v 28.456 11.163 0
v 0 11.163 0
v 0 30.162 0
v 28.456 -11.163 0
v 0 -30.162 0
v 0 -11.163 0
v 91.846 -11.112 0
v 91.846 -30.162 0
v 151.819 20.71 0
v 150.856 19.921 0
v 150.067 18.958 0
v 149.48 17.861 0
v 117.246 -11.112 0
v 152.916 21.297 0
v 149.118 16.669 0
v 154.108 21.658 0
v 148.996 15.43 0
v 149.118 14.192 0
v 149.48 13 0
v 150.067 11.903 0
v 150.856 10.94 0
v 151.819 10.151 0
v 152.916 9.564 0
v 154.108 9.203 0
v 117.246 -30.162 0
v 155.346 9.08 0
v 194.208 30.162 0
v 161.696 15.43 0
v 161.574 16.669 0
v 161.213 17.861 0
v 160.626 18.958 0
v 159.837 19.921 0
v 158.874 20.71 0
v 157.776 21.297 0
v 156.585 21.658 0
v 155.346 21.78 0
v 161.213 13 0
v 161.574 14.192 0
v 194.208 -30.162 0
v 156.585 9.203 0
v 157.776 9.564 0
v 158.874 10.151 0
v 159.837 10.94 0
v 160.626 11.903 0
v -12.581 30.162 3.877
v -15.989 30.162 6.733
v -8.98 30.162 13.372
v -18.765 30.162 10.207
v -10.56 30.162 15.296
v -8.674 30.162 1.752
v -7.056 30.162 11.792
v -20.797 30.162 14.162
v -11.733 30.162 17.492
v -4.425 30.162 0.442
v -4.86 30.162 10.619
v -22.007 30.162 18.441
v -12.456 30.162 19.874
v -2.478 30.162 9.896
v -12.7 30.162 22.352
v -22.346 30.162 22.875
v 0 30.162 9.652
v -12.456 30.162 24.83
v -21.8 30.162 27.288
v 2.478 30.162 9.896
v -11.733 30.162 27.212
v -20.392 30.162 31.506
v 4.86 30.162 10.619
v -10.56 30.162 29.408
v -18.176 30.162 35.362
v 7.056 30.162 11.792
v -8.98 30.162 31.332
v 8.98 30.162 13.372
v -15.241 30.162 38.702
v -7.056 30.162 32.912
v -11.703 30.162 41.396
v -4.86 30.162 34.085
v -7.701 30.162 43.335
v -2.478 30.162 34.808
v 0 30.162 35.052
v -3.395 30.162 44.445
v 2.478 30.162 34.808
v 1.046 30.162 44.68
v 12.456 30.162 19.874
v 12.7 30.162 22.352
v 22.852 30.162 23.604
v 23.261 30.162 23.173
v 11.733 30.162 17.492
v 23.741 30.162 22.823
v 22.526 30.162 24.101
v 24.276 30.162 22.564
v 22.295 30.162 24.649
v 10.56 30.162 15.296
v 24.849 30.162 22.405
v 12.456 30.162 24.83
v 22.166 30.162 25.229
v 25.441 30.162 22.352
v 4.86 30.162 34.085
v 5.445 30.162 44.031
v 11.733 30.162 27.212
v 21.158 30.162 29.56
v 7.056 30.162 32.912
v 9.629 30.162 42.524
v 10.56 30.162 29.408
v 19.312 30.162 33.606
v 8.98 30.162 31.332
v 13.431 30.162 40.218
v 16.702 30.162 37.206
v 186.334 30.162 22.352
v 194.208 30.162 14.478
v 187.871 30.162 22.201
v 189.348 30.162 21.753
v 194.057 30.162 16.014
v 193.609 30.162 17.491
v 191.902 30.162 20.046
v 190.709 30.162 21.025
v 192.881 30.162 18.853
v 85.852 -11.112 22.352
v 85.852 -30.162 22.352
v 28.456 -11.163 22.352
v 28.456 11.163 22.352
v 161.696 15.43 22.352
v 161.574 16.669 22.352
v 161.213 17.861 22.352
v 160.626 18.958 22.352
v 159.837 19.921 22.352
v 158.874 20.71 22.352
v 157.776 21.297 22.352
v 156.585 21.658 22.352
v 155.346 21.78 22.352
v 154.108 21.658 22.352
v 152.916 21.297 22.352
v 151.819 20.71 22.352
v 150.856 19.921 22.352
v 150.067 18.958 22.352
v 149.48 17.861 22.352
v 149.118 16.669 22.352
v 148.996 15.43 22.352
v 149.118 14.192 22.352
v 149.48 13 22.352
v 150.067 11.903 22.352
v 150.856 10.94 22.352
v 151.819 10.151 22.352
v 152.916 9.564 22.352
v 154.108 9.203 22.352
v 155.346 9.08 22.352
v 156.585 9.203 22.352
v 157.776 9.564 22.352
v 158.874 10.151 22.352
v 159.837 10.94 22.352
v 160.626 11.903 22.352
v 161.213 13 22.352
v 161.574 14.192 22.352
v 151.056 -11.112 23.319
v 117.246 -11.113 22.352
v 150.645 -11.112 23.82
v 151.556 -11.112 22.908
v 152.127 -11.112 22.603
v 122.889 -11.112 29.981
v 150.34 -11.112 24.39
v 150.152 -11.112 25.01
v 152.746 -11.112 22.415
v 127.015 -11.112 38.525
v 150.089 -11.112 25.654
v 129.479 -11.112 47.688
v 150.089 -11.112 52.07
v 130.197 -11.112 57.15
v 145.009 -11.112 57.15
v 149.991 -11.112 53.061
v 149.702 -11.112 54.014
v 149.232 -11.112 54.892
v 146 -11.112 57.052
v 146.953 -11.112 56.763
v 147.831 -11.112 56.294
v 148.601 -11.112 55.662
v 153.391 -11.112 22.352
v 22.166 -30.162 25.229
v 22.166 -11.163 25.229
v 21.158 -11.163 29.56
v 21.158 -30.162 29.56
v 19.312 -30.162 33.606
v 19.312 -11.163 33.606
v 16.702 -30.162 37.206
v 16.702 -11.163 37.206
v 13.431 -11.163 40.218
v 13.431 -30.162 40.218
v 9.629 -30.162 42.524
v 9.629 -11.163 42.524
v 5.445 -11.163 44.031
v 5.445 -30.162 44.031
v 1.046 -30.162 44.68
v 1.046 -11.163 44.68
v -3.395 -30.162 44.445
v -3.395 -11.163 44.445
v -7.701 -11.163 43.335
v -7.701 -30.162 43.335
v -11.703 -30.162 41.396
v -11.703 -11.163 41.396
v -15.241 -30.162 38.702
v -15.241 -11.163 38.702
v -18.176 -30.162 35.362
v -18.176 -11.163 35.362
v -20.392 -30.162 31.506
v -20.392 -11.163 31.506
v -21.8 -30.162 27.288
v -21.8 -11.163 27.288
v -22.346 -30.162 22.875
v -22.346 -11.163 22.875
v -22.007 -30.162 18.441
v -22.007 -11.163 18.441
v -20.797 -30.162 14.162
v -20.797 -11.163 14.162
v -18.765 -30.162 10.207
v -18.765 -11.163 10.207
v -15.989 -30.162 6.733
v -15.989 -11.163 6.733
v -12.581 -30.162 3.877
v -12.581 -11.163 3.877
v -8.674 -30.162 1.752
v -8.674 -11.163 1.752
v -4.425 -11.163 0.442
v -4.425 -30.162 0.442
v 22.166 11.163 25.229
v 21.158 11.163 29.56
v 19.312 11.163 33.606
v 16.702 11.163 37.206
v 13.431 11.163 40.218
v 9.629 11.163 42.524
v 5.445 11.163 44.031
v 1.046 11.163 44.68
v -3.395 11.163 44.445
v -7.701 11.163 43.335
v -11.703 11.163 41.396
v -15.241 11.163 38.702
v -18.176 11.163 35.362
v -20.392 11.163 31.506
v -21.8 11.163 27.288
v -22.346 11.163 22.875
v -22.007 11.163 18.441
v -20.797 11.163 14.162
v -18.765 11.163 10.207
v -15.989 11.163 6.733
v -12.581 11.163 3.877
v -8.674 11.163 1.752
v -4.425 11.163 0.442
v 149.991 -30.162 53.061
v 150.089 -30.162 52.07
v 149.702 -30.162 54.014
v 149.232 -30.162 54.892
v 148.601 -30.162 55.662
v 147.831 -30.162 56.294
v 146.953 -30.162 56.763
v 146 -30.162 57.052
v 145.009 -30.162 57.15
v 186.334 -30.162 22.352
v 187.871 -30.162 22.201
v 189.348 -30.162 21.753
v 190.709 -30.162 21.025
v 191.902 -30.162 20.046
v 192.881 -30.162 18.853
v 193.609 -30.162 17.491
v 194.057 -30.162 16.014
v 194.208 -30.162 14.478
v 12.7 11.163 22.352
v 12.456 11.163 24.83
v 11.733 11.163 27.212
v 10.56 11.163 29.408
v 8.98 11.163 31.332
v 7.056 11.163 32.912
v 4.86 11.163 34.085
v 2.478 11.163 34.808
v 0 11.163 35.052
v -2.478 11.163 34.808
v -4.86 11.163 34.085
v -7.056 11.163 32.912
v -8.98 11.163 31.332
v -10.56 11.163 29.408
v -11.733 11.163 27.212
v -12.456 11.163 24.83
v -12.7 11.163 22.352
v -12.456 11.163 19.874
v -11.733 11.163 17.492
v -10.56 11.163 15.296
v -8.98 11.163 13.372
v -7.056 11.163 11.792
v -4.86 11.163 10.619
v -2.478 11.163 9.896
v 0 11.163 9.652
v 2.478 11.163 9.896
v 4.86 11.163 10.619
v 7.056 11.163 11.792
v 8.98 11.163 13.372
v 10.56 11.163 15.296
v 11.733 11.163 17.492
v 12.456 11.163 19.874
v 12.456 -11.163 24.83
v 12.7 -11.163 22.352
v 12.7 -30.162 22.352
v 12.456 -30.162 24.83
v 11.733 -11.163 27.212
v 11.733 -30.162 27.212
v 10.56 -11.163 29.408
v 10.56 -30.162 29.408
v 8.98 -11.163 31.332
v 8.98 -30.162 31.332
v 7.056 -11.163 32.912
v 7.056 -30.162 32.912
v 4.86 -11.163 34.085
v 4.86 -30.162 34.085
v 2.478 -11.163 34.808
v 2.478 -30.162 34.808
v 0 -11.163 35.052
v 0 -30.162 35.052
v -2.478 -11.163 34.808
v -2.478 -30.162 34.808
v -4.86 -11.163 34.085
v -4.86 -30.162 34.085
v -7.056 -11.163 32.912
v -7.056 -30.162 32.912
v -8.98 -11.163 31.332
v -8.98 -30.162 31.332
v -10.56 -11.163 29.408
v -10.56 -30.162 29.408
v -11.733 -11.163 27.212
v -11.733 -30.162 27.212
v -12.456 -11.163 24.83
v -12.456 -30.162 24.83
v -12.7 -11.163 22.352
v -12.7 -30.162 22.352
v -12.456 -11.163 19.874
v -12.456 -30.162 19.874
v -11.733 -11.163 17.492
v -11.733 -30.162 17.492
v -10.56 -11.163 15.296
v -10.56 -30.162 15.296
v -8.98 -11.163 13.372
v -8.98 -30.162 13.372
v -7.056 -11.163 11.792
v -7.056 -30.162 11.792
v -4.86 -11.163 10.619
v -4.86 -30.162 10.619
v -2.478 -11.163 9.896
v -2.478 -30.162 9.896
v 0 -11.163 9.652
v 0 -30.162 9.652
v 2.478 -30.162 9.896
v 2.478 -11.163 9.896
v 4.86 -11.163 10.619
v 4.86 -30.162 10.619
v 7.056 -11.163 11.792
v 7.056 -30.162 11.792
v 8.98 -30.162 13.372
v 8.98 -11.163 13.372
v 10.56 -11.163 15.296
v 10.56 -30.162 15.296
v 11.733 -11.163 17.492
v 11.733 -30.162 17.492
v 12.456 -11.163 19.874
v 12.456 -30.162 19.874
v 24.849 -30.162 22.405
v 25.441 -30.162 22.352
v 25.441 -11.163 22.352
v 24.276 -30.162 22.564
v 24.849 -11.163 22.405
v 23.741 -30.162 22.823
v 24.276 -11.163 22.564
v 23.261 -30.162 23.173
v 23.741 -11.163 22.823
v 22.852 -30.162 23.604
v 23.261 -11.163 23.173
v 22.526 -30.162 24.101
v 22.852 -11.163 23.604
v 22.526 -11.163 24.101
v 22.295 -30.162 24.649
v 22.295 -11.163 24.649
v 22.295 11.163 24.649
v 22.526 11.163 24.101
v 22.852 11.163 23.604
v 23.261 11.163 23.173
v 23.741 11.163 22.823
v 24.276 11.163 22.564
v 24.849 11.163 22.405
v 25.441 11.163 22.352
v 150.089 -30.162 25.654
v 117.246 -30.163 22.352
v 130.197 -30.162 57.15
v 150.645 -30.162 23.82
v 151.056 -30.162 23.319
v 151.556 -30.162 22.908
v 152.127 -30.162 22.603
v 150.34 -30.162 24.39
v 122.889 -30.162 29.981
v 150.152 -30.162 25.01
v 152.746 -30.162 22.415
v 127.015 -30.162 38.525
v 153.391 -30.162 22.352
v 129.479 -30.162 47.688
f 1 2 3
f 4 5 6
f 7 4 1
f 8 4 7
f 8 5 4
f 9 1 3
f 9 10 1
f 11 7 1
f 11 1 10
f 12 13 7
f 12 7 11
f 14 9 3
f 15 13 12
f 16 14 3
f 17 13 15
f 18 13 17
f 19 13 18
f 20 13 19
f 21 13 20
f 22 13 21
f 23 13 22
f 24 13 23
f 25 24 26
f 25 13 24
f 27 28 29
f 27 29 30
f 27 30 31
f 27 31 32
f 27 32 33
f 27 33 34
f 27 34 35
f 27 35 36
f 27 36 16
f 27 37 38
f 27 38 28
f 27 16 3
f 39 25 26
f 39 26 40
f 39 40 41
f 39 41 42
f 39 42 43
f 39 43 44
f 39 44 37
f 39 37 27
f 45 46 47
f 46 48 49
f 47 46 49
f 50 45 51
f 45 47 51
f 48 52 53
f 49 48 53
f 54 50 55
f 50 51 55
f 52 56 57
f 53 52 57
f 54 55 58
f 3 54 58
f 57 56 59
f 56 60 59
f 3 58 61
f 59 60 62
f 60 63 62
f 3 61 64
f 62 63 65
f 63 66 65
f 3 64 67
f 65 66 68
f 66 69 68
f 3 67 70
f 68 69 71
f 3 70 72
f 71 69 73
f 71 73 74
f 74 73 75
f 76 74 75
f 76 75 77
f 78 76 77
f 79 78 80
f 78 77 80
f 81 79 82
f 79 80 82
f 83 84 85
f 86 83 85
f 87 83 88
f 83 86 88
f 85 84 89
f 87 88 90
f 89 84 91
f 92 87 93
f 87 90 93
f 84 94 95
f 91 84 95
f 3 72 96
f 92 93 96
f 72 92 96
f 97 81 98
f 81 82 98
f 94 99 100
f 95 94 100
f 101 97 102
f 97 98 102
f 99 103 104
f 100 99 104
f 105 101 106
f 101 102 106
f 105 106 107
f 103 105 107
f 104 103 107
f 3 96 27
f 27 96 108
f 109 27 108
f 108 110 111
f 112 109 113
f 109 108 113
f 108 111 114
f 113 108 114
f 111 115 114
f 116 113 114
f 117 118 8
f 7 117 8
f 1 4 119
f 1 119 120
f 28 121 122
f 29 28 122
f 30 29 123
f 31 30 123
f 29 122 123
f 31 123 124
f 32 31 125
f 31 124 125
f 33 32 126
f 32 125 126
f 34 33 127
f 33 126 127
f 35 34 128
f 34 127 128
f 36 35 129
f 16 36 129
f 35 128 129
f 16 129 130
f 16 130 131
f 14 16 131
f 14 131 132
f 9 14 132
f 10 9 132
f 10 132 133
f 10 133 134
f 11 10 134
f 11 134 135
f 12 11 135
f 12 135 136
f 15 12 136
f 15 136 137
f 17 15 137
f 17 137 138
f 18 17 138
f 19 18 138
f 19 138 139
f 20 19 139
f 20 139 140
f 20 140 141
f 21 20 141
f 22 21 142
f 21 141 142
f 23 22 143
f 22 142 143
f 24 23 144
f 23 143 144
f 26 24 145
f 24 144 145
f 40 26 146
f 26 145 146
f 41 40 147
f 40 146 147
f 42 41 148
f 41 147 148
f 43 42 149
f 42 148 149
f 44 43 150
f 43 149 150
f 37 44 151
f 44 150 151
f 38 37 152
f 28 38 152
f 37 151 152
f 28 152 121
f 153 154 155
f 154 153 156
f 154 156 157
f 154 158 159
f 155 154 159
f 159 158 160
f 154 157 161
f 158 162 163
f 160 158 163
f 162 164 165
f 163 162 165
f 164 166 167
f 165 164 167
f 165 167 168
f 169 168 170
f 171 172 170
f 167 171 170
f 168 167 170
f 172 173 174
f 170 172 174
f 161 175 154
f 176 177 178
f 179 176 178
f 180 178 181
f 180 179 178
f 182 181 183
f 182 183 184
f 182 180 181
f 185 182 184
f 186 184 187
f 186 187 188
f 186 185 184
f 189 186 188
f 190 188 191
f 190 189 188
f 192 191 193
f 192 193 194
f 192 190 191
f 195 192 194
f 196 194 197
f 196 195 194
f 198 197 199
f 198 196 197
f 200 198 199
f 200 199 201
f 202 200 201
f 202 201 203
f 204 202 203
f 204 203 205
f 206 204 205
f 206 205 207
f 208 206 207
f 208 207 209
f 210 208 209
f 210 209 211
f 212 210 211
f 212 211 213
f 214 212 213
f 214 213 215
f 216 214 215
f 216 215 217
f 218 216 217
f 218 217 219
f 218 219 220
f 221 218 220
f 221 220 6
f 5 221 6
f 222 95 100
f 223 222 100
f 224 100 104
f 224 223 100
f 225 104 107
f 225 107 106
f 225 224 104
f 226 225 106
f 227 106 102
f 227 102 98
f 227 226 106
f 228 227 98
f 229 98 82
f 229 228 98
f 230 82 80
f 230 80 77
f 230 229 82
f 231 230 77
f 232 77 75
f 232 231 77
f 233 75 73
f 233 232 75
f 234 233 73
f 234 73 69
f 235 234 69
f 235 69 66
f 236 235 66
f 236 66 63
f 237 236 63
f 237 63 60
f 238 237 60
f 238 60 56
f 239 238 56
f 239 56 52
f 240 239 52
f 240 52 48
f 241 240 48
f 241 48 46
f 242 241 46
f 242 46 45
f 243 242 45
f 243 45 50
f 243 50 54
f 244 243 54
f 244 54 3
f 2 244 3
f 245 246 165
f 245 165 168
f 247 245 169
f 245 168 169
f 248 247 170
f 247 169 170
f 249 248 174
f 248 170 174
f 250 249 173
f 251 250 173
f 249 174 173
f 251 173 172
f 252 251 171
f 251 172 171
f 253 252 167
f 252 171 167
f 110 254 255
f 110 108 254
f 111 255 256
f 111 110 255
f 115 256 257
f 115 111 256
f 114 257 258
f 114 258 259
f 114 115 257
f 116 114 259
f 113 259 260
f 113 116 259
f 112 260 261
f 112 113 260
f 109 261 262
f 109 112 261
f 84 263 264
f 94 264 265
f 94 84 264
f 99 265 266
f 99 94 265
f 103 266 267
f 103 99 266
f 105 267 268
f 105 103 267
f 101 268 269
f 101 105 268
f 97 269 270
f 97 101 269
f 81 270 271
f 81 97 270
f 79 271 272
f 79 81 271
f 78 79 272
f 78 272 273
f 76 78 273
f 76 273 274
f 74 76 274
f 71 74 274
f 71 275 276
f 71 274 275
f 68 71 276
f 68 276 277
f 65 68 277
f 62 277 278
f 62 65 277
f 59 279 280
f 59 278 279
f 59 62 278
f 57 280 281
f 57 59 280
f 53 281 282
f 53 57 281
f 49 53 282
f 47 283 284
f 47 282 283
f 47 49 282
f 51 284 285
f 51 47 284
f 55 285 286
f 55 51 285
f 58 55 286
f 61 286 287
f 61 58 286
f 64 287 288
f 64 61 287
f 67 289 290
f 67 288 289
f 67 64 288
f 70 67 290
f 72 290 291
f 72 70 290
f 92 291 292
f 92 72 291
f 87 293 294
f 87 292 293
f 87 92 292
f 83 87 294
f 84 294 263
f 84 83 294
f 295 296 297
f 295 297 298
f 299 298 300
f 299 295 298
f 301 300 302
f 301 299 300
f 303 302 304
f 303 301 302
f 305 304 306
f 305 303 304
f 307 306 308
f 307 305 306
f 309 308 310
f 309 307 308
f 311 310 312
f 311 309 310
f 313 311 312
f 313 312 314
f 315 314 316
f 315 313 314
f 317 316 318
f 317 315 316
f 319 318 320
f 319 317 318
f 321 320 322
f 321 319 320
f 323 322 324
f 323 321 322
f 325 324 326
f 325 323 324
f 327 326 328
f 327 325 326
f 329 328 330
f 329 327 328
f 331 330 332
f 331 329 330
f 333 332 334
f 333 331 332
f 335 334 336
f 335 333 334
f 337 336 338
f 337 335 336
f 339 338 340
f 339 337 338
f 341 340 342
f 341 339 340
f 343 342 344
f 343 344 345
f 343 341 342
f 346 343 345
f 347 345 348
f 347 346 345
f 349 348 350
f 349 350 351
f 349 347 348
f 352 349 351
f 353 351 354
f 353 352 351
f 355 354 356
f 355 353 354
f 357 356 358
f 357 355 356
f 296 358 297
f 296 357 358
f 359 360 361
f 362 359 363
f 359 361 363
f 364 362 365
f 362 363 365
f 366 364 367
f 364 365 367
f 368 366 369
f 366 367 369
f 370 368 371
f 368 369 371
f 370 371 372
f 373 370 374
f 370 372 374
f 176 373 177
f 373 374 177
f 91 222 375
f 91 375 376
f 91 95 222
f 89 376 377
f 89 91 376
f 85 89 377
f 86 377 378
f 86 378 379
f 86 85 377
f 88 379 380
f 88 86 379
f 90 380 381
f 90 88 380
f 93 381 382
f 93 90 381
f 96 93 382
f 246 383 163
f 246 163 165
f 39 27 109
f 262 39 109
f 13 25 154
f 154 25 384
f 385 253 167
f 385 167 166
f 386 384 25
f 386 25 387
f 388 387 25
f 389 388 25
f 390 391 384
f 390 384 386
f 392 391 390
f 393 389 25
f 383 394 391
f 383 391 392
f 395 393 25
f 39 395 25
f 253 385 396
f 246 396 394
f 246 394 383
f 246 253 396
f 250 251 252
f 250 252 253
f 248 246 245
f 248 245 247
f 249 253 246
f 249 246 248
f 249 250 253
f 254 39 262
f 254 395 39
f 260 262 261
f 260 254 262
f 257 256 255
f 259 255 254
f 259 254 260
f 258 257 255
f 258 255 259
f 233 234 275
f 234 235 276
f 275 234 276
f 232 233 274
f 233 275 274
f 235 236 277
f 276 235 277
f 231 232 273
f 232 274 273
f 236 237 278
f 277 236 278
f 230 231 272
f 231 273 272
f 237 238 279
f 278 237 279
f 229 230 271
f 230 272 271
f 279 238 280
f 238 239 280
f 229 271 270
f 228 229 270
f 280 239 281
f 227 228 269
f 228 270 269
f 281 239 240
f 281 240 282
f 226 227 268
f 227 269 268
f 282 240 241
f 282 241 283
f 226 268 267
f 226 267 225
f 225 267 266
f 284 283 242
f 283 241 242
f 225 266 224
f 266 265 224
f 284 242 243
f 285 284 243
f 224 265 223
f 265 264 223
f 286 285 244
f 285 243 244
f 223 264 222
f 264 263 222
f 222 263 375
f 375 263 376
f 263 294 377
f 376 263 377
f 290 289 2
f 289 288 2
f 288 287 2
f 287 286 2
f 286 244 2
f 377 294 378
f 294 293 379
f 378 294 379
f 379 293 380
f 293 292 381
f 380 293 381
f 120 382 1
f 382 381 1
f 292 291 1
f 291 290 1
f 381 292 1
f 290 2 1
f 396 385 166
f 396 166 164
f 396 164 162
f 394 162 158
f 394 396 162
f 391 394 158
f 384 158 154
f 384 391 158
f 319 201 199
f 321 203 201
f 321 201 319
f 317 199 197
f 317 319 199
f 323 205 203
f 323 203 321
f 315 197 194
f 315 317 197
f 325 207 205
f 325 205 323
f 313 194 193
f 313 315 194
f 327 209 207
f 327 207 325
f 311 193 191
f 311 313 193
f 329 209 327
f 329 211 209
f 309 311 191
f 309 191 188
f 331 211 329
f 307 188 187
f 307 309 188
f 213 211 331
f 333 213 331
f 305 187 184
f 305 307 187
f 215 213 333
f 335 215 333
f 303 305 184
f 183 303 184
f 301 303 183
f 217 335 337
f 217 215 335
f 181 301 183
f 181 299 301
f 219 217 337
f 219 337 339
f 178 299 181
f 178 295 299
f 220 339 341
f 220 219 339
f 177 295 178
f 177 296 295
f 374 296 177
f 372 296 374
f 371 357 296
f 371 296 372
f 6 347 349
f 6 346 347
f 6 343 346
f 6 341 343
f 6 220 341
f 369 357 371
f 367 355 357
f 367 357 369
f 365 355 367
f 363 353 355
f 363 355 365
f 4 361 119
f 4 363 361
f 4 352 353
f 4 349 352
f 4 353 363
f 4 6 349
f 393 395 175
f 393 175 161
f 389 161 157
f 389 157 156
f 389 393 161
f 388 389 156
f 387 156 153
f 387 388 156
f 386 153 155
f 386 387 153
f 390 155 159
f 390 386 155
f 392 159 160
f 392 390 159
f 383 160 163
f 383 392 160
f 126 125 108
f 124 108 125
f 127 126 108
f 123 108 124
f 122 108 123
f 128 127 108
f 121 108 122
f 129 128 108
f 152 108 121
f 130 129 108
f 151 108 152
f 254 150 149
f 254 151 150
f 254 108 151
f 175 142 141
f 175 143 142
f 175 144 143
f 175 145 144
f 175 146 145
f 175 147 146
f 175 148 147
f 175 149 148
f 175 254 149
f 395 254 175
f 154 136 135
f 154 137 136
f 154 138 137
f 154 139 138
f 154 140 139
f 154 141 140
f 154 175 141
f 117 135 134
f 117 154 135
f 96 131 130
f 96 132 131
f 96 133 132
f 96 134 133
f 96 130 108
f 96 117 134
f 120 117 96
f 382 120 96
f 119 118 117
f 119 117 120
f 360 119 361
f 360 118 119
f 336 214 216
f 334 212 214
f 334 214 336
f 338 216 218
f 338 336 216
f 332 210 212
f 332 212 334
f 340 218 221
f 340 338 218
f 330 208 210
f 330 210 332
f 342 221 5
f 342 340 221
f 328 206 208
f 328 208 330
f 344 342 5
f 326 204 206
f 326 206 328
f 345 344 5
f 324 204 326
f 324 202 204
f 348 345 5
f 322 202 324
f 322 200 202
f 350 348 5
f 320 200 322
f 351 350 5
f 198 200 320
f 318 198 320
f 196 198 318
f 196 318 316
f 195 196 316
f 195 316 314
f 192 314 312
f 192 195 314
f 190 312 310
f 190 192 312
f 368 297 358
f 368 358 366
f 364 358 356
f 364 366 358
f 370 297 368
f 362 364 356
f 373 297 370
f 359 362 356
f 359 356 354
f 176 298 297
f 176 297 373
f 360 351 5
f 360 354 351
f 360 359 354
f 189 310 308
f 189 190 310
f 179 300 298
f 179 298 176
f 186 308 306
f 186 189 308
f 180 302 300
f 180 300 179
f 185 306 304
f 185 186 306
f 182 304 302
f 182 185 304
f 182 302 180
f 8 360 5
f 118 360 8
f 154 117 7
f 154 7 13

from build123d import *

# Parameters (mm, degrees)
F0_R      = 12.7
F1_DEPTH  = 30.1625
F2_W      = 56.912827603
F2_H      = 22.3266
F3_DEPTH  = 44.705
F4_R      = 3.302
F5_R      = 3.302
F6_R      = 6.35
F7_DEPTH  = 22.353
F9_DEPTH  = 19.05
F11_DEPTH = 19.05
F12_R     = 7.874
F13_R     = 5.08


with BuildPart() as f1:
    # F0 (on Front) → F1 (new body, symmetric)
    with BuildSketch(Plane.XZ):
        with BuildLine():
            ThreePointArc((22.352, 22.352), (-15.8052507731, 38.1572507731), (0, 0))
            Line((0, 0), (194.2084, 0))
            Line((194.2084, 0), (194.2084, 22.352))
            Line((194.2084, 22.352), (22.352, 22.352))
        make_face()
        with Locations((0, 22.352)):
            Circle(F0_R, mode=Mode.SUBTRACT)
    extrude(amount=F1_DEPTH, both=True)

    # F2 (on Top) → F3 (cut, through all)
    with BuildSketch(Plane.XY):
        Rectangle(F2_W, F2_H)
    extrude(amount=F3_DEPTH, mode=Mode.SUBTRACT)

    # F4
    f4_edges = [f1.edges().sort_by_distance(p)[0] for p in [
        (22.352, 20.6629, 22.352),
    ]]
    fillet(f4_edges, radius=F4_R)

    # F5
    f5_edges = [f1.edges().sort_by_distance(p)[0] for p in [
        (22.352, -20.6629, 22.352),
    ]]
    fillet(f5_edges, radius=F5_R)

    # F6 (on face) → F7 (cut, through all)
    with BuildSketch(Plane.XY.offset(22.352)):
        with Locations((155.3464, 15.4305)):
            Circle(F6_R)
    extrude(amount=-F7_DEPTH, mode=Mode.SUBTRACT)

    # F8 (on face) → F9 (cut)
    with BuildSketch(Plane.XZ.offset(30.1625)):
        Polygon((117.2464, 0), (117.2464, 22.352), (85.852, 22.352), (91.8464, 0), align=None)
    extrude(amount=-F9_DEPTH, mode=Mode.SUBTRACT)

    # F10 (on face) → F11 (join)
    with BuildSketch(Plane.XZ.offset(30.1625)):
        with BuildLine():
            ThreePointArc((130.1968694519, 57.15), (127.0147572456, 38.5254271914), (117.2464, 22.352))
            Line((117.2464, 22.352), (150.0886, 22.352))
            Line((150.0886, 22.352), (153.3906, 22.352))
            ThreePointArc((153.3906, 22.352), (151.0557334085, 23.3191334085), (150.0886, 25.654))
            Line((150.0886, 25.654), (150.0886, 57.15))
            Line((150.0886, 57.15), (130.1968694519, 57.15))
        make_face()
    extrude(amount=-F11_DEPTH)

    # F12
    f12_edges = [f1.edges().sort_by_distance(p)[0] for p in [
        (194.2084, 0, 22.352),
    ]]
    fillet(f12_edges, radius=F12_R)

    # F13
    f13_edges = [f1.edges().sort_by_distance(p)[0] for p in [
        (150.0886, -20.6375, 57.15),
    ]]
    fillet(f13_edges, radius=F13_R)


solid = f1.part
